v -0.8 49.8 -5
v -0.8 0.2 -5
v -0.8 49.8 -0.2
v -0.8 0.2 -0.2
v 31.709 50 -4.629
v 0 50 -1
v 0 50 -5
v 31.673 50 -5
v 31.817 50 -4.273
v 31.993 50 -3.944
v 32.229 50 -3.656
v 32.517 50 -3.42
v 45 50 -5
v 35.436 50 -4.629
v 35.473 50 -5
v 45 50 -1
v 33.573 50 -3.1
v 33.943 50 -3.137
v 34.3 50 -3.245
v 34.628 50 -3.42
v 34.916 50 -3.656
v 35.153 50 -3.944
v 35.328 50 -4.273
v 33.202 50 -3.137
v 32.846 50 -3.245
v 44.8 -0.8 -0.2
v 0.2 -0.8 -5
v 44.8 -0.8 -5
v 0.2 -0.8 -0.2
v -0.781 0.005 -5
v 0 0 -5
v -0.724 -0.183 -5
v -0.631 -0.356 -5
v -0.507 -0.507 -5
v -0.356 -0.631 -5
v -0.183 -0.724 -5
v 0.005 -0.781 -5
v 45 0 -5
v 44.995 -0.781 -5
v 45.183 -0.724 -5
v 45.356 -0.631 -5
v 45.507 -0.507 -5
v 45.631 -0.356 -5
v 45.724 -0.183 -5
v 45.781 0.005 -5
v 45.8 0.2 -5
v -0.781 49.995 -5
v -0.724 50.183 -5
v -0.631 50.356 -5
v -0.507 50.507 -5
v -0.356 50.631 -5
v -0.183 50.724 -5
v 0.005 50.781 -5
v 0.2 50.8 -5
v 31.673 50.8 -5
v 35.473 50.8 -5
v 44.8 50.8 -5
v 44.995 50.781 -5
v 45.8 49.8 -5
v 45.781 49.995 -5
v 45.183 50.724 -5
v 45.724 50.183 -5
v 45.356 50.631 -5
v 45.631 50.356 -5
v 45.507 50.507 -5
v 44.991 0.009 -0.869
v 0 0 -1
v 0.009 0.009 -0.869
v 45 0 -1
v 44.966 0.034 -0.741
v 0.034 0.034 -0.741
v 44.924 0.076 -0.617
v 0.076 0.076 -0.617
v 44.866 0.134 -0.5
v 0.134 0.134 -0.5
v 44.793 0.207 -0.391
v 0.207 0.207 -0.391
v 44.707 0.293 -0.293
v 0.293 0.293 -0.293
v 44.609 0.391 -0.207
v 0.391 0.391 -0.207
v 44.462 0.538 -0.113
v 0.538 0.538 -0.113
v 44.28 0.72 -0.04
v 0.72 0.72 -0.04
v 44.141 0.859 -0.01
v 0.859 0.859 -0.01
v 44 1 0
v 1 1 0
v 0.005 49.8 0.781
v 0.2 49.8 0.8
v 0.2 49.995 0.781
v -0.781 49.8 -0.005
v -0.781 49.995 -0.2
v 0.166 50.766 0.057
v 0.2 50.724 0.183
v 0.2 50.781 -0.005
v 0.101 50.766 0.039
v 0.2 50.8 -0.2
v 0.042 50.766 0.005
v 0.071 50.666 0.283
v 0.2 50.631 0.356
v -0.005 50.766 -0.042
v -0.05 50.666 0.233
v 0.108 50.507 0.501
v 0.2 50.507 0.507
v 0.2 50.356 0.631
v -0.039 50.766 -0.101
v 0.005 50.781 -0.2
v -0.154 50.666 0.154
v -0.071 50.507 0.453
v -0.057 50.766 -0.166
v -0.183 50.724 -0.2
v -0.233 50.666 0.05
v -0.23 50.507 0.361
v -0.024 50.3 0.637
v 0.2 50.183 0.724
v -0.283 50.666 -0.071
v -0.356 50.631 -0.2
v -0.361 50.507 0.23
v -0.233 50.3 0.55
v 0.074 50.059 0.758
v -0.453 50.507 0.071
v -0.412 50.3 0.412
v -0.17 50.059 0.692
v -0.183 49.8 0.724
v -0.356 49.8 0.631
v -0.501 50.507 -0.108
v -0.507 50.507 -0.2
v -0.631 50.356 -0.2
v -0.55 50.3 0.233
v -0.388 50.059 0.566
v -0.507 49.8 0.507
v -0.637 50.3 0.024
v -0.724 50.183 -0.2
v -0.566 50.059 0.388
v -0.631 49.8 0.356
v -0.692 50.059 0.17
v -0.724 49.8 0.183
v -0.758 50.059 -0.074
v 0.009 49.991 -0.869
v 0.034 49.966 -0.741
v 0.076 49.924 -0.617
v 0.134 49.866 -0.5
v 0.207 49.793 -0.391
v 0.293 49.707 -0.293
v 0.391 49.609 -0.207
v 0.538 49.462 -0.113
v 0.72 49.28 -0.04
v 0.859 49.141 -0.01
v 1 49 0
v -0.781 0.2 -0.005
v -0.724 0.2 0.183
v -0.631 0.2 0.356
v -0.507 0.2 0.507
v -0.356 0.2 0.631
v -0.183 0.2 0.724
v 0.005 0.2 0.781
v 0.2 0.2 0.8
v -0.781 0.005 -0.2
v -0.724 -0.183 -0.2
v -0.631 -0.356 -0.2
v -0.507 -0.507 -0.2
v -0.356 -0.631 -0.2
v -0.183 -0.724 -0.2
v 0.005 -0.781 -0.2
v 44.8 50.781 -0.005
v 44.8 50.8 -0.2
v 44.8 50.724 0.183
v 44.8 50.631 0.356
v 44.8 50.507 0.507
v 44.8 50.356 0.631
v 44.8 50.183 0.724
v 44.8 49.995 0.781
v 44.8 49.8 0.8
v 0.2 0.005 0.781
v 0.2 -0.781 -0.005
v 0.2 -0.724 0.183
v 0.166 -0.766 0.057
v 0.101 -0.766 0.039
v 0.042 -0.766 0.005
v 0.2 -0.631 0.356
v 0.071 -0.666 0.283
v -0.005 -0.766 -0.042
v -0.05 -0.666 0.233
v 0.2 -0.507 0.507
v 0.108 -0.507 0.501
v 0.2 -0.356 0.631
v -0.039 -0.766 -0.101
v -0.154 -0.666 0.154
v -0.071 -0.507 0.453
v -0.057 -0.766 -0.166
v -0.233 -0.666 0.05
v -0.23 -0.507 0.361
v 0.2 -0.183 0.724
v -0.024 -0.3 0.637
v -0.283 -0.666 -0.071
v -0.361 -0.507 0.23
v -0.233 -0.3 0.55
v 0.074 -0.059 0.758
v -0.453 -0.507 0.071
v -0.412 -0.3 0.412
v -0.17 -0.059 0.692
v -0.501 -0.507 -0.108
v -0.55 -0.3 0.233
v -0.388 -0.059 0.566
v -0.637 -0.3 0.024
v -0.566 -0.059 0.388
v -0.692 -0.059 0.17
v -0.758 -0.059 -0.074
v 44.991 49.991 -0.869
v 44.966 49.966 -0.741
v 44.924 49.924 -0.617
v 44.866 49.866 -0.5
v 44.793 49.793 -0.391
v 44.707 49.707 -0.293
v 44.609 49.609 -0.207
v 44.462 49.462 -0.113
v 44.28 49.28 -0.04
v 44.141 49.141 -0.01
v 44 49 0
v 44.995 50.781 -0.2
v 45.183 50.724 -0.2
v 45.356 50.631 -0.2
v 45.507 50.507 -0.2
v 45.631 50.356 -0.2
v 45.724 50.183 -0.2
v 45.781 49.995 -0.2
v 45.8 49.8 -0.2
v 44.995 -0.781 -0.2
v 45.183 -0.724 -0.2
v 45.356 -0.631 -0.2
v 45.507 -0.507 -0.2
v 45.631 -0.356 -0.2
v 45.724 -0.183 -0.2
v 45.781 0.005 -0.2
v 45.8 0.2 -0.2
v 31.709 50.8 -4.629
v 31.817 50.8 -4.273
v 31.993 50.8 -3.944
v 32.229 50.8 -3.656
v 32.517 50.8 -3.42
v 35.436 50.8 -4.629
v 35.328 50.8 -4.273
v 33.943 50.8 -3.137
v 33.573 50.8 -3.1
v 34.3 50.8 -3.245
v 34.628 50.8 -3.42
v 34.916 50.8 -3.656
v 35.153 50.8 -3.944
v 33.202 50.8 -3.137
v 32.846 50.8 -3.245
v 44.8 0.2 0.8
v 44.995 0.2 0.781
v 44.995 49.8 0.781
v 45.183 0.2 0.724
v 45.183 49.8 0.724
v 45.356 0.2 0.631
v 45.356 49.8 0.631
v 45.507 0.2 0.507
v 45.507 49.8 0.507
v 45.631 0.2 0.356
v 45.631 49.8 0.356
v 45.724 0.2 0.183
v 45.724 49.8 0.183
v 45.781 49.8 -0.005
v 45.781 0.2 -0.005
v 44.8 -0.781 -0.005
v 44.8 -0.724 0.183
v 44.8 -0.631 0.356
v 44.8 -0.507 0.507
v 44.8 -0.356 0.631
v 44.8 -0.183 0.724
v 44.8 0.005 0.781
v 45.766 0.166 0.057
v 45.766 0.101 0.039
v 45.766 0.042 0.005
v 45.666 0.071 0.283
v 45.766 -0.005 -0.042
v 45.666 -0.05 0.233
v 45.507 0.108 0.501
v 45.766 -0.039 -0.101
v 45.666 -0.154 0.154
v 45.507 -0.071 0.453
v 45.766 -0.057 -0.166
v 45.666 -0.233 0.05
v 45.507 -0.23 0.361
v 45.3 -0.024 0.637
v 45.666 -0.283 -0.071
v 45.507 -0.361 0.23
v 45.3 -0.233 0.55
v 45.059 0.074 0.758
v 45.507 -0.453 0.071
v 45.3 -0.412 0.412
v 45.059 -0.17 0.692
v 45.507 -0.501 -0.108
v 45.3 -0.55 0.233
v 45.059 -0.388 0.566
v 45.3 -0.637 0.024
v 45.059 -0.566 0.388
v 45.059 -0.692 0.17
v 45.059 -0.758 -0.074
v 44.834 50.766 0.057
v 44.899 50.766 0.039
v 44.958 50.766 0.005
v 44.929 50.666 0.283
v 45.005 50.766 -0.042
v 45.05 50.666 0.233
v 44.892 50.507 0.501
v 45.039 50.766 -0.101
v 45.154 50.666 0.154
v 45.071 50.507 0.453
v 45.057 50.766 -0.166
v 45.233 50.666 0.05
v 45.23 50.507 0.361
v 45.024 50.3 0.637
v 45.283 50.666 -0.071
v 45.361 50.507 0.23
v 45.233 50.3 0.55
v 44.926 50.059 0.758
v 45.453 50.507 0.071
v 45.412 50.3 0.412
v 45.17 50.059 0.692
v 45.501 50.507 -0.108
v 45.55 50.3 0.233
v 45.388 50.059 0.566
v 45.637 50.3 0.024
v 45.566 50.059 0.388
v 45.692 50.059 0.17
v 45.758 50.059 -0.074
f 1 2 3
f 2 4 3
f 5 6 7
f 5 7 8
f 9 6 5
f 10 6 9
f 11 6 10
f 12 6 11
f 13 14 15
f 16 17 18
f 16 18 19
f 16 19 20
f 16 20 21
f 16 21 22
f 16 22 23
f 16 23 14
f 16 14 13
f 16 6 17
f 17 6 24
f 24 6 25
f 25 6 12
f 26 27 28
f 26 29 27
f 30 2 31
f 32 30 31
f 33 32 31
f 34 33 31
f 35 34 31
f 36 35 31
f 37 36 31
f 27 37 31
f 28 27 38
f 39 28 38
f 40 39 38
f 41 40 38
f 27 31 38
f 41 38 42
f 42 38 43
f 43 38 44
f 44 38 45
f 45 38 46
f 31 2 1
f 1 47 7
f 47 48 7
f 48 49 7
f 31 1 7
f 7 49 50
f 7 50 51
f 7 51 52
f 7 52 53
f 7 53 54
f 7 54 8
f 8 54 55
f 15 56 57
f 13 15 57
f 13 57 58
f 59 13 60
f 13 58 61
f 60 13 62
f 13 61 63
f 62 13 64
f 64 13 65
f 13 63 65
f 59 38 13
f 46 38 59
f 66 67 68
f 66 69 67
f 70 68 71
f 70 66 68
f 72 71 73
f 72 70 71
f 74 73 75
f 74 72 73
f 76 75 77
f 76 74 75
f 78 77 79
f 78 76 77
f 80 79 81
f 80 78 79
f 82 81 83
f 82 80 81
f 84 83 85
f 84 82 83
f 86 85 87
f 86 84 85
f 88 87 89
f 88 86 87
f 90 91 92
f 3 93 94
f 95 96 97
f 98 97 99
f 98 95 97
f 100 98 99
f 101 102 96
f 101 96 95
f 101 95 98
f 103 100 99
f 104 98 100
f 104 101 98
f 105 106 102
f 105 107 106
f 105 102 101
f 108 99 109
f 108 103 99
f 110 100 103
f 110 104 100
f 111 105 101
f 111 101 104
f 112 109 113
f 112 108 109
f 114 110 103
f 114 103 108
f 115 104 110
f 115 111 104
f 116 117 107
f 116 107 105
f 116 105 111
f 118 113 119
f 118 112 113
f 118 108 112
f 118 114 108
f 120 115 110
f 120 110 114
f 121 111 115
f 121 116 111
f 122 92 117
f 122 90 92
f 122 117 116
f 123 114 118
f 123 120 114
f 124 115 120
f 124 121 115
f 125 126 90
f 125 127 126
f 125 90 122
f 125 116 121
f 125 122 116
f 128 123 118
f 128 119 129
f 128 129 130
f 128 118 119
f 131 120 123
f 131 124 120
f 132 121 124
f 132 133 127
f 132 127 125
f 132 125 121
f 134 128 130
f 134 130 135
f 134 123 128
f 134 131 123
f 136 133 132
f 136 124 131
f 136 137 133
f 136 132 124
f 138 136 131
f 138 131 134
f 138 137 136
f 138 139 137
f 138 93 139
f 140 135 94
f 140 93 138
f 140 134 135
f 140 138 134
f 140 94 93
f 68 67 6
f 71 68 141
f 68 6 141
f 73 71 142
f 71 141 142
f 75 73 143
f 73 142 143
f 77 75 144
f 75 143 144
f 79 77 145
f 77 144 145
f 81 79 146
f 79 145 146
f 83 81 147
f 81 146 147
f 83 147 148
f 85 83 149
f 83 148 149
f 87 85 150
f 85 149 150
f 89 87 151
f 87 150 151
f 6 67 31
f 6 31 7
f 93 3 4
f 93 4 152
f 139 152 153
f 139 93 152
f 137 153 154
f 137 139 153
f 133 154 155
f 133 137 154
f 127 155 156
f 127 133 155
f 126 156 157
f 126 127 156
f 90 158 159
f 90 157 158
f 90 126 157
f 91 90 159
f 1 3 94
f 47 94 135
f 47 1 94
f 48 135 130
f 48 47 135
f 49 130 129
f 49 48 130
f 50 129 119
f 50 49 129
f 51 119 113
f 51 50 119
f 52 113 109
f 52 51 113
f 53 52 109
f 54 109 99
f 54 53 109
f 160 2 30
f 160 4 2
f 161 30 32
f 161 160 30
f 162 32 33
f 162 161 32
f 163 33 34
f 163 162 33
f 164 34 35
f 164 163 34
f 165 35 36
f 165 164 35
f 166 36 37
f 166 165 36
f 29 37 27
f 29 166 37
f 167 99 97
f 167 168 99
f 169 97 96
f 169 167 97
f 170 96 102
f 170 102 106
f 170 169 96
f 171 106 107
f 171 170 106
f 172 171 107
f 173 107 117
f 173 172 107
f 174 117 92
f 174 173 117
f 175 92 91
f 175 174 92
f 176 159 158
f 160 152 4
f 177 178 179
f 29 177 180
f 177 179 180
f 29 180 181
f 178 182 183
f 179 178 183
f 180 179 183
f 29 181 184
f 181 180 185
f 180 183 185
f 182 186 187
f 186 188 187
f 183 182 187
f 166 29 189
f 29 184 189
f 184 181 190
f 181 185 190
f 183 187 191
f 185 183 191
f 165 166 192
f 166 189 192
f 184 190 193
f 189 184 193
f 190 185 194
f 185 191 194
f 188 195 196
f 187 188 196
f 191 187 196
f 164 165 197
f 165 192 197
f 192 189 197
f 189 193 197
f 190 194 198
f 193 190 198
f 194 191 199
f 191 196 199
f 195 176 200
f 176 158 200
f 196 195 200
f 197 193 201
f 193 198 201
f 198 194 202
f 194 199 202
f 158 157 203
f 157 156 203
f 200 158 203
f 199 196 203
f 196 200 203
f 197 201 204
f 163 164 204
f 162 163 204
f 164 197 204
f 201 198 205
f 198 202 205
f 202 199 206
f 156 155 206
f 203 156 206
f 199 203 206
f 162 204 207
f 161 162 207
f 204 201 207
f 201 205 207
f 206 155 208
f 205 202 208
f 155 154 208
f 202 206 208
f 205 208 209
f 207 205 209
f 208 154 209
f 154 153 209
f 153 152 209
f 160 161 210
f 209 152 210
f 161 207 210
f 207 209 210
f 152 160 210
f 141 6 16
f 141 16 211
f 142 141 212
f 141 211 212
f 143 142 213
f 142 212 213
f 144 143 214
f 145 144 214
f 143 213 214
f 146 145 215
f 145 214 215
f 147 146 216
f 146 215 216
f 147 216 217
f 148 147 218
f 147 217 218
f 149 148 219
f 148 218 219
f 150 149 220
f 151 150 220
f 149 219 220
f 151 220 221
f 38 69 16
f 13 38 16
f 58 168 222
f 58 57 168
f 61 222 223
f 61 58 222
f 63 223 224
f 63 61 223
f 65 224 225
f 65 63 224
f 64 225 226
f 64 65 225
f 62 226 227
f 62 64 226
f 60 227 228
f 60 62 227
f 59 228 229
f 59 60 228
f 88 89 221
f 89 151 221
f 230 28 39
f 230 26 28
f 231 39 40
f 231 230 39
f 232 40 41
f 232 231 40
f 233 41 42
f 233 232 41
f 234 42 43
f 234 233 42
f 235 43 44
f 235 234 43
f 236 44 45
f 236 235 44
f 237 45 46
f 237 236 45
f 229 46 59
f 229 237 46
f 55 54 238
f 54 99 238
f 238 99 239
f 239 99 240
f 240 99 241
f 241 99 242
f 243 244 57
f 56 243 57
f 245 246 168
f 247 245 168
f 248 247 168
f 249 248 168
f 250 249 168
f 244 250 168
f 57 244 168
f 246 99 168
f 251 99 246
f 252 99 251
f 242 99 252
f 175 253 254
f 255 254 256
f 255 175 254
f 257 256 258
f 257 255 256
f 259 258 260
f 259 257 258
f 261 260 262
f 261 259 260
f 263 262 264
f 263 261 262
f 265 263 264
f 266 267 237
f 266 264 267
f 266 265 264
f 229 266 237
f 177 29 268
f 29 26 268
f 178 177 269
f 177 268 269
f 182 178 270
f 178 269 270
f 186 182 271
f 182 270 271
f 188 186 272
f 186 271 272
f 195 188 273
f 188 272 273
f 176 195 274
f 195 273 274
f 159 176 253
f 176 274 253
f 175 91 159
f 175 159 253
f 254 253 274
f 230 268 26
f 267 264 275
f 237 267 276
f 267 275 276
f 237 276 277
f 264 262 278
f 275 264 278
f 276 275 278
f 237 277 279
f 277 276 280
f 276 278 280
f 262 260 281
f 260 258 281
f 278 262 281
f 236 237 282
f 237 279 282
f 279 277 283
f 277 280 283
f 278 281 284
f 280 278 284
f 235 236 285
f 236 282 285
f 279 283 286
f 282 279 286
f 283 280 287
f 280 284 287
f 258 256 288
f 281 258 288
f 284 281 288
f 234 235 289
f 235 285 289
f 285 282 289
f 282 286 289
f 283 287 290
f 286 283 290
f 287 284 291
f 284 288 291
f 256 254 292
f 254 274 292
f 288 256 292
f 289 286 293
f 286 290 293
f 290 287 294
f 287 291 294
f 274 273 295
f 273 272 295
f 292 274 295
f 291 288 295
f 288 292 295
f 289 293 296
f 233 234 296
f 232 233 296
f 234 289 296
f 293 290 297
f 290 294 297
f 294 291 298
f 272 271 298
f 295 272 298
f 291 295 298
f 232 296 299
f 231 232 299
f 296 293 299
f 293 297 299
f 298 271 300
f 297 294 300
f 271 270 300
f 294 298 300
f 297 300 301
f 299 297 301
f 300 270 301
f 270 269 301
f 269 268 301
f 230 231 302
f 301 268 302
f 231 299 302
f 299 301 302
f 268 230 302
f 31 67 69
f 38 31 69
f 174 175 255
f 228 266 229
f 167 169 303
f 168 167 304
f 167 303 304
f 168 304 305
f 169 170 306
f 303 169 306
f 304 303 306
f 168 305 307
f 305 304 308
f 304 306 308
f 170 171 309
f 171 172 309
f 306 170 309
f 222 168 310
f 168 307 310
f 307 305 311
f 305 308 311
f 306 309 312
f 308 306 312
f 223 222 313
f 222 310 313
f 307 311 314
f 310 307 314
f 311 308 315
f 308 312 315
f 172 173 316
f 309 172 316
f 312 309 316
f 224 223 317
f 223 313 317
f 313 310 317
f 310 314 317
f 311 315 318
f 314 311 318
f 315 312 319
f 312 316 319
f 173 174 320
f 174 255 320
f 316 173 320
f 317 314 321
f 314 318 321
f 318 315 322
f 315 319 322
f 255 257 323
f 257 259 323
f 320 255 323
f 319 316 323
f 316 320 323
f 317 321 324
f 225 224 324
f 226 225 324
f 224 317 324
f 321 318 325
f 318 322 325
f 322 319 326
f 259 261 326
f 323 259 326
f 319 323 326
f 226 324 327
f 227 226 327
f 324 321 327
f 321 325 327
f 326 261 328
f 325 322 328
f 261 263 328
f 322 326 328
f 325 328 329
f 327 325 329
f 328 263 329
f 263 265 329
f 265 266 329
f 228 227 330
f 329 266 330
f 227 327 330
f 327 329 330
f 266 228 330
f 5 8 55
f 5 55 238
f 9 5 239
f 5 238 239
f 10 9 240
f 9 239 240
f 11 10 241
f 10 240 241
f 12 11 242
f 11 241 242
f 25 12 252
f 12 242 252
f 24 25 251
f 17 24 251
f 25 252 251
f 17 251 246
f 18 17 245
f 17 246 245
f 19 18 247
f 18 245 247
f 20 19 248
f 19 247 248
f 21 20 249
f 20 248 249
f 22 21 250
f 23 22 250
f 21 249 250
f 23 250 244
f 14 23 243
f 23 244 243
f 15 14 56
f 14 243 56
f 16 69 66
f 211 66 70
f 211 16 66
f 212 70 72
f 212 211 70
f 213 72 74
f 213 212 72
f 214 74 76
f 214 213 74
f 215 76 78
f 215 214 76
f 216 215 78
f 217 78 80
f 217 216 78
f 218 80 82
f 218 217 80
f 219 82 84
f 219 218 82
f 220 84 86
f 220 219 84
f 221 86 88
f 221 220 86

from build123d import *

# Parameters (mm, degrees)
F0_W     = 46.6
F0_H     = 51.6
F0_W_2   = 45
F0_H_2   = 50
F1_DEPTH = 0.8
F2_DEPTH = 5
F4_DEPTH = 0.8
F5_R     = 1


with BuildPart() as f1:
    # F0 (on Top) → F1 (new body)
    with BuildSketch(Plane.XY):
        with Locations((22.5, 25)):
            Rectangle(F0_W, F0_H)
        with Locations((22.5, 25)):
            Rectangle(F0_W_2, F0_H_2, mode=Mode.SUBTRACT)
        with Locations((22.5, 25)):
            Rectangle(F0_W_2, F0_H_2)
    extrude(amount=F1_DEPTH)

    # F0 (on Top) → F2 (join)
    with BuildSketch(Plane.XY):
        with Locations((22.5, 25)):
            Rectangle(F0_W, F0_H)
        with Locations((22.5, 25)):
            Rectangle(F0_W_2, F0_H_2, mode=Mode.SUBTRACT)
    extrude(amount=-F2_DEPTH)

    # F3 (on face) → F4 (cut, through all)
    with BuildSketch(Plane(origin=(0, 50.8, 0), x_dir=(-1, 0, 0), z_dir=(0, 1, 0))):
        with BuildLine():
            Line((-35.47274, -5), (-31.67274, -5))
            ThreePointArc((-31.67274, -5), (-33.57274, -3.1), (-35.47274, -5))
        make_face()
        with BuildLine():
            ThreePointArc((-35.47274, -5), (-33.57274, -6.9), (-31.67274, -5))
            Line((-31.67274, -5), (-35.47274, -5))
        make_face()
    extrude(amount=-F4_DEPTH, mode=Mode.SUBTRACT)

    # F5
    f5_edges = [f1.edges().sort_by_distance(p)[0] for p in [
        (-0.8, 25, 0.8),
        (22.5, -0.8, 0.8),
        (45.8, 25, 0.8),
        (22.5, 50.8, 0.8),
        (-0.8, 50.8, -2.1),
        (45.8, 50.8, -2.1),
        (-0.8, -0.8, -2.1),
        (45.8, -0.8, -2.1),
        (22.5, 0, 0),
        (0, 25, 0),
        (22.5, 50, 0),
        (45, 25, 0),
    ]]
    fillet(f5_edges, radius=F5_R)


solid = f1.part
